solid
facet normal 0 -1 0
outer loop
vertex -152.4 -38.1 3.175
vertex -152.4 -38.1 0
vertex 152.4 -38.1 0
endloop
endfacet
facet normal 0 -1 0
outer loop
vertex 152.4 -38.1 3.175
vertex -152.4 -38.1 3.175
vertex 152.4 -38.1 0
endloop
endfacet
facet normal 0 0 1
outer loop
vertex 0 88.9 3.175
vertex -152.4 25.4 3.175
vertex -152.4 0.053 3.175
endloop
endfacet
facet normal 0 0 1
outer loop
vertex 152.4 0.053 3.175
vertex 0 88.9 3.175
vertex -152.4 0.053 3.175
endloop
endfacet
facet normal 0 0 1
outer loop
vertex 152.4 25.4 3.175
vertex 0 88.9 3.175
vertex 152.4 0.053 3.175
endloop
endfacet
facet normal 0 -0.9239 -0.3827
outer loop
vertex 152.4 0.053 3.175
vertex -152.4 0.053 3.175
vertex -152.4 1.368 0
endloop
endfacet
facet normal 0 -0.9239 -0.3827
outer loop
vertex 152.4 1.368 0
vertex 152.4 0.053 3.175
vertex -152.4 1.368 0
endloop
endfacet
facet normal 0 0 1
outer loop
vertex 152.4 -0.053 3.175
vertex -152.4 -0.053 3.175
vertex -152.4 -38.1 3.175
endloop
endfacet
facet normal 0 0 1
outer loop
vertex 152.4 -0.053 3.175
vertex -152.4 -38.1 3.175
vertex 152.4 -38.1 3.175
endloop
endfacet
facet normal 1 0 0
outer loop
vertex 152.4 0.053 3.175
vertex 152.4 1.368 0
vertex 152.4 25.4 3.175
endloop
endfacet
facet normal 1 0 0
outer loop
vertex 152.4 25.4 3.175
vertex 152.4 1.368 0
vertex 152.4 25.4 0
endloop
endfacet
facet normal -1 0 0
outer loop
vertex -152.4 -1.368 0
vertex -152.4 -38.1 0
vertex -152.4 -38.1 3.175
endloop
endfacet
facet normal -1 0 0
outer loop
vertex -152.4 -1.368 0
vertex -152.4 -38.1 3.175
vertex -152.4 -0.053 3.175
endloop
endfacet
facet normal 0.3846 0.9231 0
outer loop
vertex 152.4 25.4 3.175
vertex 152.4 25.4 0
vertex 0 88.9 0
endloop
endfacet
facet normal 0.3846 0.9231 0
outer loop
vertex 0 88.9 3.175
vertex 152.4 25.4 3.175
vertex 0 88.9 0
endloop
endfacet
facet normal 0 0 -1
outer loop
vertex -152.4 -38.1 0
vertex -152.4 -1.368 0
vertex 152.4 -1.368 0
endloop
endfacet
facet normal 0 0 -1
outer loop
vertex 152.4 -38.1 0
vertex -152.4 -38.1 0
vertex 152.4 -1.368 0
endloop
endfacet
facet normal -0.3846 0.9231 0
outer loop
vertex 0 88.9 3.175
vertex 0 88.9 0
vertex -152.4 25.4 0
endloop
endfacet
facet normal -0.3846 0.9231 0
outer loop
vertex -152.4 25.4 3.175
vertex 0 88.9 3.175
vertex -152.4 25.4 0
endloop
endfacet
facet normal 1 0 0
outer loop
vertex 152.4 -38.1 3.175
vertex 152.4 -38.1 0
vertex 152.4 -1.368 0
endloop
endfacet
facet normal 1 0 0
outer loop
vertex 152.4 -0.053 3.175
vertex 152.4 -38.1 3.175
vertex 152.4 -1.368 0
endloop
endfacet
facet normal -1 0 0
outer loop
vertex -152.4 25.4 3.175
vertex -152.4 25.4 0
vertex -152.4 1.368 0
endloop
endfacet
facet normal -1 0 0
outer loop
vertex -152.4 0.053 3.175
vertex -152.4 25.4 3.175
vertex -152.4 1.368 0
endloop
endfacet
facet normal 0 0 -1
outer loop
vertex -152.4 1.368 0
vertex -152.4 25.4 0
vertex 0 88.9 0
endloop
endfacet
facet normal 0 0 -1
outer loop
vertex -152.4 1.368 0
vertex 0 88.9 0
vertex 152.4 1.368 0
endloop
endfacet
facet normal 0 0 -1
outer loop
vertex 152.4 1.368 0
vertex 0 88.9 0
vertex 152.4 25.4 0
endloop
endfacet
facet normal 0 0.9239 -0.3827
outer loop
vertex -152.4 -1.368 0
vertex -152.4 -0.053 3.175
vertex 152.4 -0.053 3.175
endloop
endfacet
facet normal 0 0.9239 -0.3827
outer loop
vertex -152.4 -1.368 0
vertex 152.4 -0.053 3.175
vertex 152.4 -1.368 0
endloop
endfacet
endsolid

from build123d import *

# Parameters (mm, degrees)
F1_DEPTH    = 3.175
F0_W        = 152.4
F0_H        = 38.1
F2_DEPTH    = 3.175
F3_T1_DEPTH = 321.9219952748
F4_T1_DEPTH = 321.9219952748


# Not quite as in the source:
# - a fillet or chamfer that OpenCascade refuses, or shapes differently, is made with other operations: its cross-section is extruded or revolved along the edge and cut away or added


with BuildPart() as f1:
    # F0 (on Top) → F1 (new body)
    with BuildSketch(Plane.XY):
        Polygon((-152.4, 25.4), (-152.4, 0), (0, 0), (0, 88.9), align=None)
        Polygon((0, 88.9), (0, 0), (152.4, 0), (152.4, 25.4), align=None)
    extrude(amount=F1_DEPTH)

    # F3: chamfer of 3.302 x 1.367733183 on 1 edges, made by hand

    # F3_s2 → F3_t1 (cut)
    with BuildSketch(Plane.YZ.offset(-160.9609976374)):
        Polygon((0, 3.302), (1.367733183, 0), (0, 0), align=None)
    extrude(amount=F3_T1_DEPTH, mode=Mode.SUBTRACT)


with BuildPart() as f2:
    # F0 (on Top) → F2 (new body)
    with BuildSketch(Plane.XY):
        with Locations((-76.2, -19.05)):
            Rectangle(F0_W, F0_H)
        with Locations((76.2, -19.05)):
            Rectangle(F0_W, F0_H)
    extrude(amount=F2_DEPTH)

    # F4: chamfer of 3.302 x 1.367733183 on 1 edges, made by hand

    # F4_s2 → F4_t1 (cut)
    with BuildSketch(Plane.YZ.offset(-160.9609976374)):
        Polygon((0, 3.302), (-1.367733183, 0), (0, 0), align=None)
    extrude(amount=F4_T1_DEPTH, mode=Mode.SUBTRACT)


solid = Compound([f1.part, f2.part])
